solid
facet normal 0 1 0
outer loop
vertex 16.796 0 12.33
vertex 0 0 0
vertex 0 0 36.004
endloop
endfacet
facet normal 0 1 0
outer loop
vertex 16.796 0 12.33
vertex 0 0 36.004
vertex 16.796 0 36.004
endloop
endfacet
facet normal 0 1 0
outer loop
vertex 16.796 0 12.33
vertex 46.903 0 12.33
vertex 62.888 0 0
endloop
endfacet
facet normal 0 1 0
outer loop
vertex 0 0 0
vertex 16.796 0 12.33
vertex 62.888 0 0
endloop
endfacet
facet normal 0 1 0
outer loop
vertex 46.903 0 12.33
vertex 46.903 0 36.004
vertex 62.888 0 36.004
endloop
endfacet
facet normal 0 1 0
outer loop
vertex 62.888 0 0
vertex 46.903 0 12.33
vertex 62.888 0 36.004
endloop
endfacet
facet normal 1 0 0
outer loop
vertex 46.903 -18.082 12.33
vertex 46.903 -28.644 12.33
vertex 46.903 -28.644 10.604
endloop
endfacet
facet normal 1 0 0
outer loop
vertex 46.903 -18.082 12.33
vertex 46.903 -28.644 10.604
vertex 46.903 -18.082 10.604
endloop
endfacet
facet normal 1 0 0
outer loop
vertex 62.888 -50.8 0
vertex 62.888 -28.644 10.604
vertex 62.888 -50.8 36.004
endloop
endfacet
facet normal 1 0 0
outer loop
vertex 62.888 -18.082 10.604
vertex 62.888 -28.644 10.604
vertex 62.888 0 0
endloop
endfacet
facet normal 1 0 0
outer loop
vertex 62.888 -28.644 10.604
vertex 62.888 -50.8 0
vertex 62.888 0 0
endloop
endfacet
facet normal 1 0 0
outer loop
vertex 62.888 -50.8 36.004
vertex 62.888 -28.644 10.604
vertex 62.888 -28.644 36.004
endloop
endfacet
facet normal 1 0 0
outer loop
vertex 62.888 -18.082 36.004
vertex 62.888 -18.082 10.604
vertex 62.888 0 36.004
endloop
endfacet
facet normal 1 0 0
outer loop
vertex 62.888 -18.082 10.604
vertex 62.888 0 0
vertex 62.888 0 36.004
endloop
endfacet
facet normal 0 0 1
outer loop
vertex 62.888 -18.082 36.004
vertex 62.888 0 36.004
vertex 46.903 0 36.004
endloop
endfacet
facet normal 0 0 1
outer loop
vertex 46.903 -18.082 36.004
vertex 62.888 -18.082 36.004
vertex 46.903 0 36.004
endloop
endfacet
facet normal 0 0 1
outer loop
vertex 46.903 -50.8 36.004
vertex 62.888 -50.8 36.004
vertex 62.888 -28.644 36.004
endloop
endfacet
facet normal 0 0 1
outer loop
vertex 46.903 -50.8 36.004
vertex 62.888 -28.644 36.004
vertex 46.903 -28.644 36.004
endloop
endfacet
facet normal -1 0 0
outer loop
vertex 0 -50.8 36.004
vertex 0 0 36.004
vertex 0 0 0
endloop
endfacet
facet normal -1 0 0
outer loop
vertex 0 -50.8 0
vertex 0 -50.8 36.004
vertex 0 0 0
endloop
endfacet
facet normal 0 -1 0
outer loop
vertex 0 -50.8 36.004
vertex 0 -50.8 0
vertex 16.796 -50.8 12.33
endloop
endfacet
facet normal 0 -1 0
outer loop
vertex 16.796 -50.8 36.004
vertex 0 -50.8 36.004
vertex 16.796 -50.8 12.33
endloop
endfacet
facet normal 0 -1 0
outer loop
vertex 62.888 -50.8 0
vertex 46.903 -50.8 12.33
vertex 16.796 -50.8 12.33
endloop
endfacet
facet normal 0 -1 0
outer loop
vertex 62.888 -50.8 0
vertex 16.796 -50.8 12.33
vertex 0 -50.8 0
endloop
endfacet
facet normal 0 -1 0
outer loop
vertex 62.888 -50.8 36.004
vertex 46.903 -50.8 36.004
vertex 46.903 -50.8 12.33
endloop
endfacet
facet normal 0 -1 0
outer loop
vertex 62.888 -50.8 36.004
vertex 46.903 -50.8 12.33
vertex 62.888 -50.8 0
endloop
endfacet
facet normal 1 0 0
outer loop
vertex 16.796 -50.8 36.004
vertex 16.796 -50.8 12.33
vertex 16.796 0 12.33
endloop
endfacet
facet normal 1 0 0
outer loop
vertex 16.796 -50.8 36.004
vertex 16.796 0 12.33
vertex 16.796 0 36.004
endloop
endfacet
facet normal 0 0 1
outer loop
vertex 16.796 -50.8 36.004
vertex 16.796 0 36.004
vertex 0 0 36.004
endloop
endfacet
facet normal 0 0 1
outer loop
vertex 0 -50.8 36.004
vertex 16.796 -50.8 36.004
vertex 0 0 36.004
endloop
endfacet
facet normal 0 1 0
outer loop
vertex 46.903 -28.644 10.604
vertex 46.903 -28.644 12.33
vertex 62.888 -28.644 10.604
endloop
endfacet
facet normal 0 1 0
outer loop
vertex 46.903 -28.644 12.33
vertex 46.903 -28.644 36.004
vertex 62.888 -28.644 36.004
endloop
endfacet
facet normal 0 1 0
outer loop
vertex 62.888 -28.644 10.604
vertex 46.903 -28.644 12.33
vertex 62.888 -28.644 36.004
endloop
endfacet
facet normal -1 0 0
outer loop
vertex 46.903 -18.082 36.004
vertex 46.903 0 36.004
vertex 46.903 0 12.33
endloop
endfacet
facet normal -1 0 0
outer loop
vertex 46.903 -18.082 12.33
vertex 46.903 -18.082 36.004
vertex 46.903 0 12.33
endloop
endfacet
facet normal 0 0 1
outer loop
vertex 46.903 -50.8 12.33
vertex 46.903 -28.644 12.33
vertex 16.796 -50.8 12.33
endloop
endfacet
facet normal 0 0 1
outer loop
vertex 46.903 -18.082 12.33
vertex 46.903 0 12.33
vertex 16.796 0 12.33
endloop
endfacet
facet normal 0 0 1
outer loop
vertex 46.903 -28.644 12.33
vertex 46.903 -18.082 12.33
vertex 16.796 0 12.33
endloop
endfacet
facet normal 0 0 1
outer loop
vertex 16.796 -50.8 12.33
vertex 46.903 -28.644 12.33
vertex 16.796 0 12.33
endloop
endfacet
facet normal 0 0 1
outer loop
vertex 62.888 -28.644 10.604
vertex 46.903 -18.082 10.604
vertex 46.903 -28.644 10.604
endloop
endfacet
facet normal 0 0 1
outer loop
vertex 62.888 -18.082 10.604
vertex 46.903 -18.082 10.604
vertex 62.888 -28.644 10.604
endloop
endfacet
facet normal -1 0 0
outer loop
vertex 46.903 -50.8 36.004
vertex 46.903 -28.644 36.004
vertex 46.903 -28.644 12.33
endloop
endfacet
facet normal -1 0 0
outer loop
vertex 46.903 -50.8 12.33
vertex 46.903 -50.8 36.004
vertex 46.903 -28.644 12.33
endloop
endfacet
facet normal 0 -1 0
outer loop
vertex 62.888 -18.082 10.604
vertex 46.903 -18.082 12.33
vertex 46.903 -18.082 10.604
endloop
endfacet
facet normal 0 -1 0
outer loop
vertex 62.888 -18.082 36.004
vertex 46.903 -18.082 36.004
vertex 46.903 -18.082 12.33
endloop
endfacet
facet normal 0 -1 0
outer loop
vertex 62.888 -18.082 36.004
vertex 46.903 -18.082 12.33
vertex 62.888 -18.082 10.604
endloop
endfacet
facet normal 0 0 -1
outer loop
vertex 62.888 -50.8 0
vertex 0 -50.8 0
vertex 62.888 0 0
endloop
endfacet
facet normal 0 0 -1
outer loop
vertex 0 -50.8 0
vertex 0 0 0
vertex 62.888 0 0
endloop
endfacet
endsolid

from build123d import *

# Parameters (mm, degrees)
F1_DEPTH = 25.4
F2_DEPTH = 25.4
F3_W     = 15.985176
F3_H     = 10.561323
F4_DEPTH = 25.4


with BuildPart() as f1:
    # F0 (on Front) → F1 (new body)
    with BuildSketch(Plane.XZ):
        Polygon((0, 36.004499), (0, 0), (62.887855, 0), (62.887855, 36.004499), (46.902679, 36.004499), (46.902679, 12.330239), (16.79617, 12.330239), (16.79617, 36.004499), align=None)
    extrude(amount=F1_DEPTH)

    # F1_face (on face) → F2 (join)
    with BuildSketch(Plane(origin=(31.257644, -25.4, 15.170026), x_dir=(1, 0, 0), z_dir=(0, -1, 0))):
        Polygon((-31.257644, 20.834473), (-31.257644, -15.170026), (31.630211, -15.170026), (31.630211, 20.834473), (15.645035, 20.834473), (15.645035, -2.839787), (-14.461474, -2.839787), (-14.461474, 20.834473), align=None)
    extrude(amount=F2_DEPTH)

    # F3 (on face) → F4 (cut)
    with BuildSketch(Plane.XY.offset(36.004499)):
        with Locations((54.895267, -23.362921)):
            Rectangle(F3_W, F3_H)
    extrude(amount=-F4_DEPTH, mode=Mode.SUBTRACT)


solid = f1.part
